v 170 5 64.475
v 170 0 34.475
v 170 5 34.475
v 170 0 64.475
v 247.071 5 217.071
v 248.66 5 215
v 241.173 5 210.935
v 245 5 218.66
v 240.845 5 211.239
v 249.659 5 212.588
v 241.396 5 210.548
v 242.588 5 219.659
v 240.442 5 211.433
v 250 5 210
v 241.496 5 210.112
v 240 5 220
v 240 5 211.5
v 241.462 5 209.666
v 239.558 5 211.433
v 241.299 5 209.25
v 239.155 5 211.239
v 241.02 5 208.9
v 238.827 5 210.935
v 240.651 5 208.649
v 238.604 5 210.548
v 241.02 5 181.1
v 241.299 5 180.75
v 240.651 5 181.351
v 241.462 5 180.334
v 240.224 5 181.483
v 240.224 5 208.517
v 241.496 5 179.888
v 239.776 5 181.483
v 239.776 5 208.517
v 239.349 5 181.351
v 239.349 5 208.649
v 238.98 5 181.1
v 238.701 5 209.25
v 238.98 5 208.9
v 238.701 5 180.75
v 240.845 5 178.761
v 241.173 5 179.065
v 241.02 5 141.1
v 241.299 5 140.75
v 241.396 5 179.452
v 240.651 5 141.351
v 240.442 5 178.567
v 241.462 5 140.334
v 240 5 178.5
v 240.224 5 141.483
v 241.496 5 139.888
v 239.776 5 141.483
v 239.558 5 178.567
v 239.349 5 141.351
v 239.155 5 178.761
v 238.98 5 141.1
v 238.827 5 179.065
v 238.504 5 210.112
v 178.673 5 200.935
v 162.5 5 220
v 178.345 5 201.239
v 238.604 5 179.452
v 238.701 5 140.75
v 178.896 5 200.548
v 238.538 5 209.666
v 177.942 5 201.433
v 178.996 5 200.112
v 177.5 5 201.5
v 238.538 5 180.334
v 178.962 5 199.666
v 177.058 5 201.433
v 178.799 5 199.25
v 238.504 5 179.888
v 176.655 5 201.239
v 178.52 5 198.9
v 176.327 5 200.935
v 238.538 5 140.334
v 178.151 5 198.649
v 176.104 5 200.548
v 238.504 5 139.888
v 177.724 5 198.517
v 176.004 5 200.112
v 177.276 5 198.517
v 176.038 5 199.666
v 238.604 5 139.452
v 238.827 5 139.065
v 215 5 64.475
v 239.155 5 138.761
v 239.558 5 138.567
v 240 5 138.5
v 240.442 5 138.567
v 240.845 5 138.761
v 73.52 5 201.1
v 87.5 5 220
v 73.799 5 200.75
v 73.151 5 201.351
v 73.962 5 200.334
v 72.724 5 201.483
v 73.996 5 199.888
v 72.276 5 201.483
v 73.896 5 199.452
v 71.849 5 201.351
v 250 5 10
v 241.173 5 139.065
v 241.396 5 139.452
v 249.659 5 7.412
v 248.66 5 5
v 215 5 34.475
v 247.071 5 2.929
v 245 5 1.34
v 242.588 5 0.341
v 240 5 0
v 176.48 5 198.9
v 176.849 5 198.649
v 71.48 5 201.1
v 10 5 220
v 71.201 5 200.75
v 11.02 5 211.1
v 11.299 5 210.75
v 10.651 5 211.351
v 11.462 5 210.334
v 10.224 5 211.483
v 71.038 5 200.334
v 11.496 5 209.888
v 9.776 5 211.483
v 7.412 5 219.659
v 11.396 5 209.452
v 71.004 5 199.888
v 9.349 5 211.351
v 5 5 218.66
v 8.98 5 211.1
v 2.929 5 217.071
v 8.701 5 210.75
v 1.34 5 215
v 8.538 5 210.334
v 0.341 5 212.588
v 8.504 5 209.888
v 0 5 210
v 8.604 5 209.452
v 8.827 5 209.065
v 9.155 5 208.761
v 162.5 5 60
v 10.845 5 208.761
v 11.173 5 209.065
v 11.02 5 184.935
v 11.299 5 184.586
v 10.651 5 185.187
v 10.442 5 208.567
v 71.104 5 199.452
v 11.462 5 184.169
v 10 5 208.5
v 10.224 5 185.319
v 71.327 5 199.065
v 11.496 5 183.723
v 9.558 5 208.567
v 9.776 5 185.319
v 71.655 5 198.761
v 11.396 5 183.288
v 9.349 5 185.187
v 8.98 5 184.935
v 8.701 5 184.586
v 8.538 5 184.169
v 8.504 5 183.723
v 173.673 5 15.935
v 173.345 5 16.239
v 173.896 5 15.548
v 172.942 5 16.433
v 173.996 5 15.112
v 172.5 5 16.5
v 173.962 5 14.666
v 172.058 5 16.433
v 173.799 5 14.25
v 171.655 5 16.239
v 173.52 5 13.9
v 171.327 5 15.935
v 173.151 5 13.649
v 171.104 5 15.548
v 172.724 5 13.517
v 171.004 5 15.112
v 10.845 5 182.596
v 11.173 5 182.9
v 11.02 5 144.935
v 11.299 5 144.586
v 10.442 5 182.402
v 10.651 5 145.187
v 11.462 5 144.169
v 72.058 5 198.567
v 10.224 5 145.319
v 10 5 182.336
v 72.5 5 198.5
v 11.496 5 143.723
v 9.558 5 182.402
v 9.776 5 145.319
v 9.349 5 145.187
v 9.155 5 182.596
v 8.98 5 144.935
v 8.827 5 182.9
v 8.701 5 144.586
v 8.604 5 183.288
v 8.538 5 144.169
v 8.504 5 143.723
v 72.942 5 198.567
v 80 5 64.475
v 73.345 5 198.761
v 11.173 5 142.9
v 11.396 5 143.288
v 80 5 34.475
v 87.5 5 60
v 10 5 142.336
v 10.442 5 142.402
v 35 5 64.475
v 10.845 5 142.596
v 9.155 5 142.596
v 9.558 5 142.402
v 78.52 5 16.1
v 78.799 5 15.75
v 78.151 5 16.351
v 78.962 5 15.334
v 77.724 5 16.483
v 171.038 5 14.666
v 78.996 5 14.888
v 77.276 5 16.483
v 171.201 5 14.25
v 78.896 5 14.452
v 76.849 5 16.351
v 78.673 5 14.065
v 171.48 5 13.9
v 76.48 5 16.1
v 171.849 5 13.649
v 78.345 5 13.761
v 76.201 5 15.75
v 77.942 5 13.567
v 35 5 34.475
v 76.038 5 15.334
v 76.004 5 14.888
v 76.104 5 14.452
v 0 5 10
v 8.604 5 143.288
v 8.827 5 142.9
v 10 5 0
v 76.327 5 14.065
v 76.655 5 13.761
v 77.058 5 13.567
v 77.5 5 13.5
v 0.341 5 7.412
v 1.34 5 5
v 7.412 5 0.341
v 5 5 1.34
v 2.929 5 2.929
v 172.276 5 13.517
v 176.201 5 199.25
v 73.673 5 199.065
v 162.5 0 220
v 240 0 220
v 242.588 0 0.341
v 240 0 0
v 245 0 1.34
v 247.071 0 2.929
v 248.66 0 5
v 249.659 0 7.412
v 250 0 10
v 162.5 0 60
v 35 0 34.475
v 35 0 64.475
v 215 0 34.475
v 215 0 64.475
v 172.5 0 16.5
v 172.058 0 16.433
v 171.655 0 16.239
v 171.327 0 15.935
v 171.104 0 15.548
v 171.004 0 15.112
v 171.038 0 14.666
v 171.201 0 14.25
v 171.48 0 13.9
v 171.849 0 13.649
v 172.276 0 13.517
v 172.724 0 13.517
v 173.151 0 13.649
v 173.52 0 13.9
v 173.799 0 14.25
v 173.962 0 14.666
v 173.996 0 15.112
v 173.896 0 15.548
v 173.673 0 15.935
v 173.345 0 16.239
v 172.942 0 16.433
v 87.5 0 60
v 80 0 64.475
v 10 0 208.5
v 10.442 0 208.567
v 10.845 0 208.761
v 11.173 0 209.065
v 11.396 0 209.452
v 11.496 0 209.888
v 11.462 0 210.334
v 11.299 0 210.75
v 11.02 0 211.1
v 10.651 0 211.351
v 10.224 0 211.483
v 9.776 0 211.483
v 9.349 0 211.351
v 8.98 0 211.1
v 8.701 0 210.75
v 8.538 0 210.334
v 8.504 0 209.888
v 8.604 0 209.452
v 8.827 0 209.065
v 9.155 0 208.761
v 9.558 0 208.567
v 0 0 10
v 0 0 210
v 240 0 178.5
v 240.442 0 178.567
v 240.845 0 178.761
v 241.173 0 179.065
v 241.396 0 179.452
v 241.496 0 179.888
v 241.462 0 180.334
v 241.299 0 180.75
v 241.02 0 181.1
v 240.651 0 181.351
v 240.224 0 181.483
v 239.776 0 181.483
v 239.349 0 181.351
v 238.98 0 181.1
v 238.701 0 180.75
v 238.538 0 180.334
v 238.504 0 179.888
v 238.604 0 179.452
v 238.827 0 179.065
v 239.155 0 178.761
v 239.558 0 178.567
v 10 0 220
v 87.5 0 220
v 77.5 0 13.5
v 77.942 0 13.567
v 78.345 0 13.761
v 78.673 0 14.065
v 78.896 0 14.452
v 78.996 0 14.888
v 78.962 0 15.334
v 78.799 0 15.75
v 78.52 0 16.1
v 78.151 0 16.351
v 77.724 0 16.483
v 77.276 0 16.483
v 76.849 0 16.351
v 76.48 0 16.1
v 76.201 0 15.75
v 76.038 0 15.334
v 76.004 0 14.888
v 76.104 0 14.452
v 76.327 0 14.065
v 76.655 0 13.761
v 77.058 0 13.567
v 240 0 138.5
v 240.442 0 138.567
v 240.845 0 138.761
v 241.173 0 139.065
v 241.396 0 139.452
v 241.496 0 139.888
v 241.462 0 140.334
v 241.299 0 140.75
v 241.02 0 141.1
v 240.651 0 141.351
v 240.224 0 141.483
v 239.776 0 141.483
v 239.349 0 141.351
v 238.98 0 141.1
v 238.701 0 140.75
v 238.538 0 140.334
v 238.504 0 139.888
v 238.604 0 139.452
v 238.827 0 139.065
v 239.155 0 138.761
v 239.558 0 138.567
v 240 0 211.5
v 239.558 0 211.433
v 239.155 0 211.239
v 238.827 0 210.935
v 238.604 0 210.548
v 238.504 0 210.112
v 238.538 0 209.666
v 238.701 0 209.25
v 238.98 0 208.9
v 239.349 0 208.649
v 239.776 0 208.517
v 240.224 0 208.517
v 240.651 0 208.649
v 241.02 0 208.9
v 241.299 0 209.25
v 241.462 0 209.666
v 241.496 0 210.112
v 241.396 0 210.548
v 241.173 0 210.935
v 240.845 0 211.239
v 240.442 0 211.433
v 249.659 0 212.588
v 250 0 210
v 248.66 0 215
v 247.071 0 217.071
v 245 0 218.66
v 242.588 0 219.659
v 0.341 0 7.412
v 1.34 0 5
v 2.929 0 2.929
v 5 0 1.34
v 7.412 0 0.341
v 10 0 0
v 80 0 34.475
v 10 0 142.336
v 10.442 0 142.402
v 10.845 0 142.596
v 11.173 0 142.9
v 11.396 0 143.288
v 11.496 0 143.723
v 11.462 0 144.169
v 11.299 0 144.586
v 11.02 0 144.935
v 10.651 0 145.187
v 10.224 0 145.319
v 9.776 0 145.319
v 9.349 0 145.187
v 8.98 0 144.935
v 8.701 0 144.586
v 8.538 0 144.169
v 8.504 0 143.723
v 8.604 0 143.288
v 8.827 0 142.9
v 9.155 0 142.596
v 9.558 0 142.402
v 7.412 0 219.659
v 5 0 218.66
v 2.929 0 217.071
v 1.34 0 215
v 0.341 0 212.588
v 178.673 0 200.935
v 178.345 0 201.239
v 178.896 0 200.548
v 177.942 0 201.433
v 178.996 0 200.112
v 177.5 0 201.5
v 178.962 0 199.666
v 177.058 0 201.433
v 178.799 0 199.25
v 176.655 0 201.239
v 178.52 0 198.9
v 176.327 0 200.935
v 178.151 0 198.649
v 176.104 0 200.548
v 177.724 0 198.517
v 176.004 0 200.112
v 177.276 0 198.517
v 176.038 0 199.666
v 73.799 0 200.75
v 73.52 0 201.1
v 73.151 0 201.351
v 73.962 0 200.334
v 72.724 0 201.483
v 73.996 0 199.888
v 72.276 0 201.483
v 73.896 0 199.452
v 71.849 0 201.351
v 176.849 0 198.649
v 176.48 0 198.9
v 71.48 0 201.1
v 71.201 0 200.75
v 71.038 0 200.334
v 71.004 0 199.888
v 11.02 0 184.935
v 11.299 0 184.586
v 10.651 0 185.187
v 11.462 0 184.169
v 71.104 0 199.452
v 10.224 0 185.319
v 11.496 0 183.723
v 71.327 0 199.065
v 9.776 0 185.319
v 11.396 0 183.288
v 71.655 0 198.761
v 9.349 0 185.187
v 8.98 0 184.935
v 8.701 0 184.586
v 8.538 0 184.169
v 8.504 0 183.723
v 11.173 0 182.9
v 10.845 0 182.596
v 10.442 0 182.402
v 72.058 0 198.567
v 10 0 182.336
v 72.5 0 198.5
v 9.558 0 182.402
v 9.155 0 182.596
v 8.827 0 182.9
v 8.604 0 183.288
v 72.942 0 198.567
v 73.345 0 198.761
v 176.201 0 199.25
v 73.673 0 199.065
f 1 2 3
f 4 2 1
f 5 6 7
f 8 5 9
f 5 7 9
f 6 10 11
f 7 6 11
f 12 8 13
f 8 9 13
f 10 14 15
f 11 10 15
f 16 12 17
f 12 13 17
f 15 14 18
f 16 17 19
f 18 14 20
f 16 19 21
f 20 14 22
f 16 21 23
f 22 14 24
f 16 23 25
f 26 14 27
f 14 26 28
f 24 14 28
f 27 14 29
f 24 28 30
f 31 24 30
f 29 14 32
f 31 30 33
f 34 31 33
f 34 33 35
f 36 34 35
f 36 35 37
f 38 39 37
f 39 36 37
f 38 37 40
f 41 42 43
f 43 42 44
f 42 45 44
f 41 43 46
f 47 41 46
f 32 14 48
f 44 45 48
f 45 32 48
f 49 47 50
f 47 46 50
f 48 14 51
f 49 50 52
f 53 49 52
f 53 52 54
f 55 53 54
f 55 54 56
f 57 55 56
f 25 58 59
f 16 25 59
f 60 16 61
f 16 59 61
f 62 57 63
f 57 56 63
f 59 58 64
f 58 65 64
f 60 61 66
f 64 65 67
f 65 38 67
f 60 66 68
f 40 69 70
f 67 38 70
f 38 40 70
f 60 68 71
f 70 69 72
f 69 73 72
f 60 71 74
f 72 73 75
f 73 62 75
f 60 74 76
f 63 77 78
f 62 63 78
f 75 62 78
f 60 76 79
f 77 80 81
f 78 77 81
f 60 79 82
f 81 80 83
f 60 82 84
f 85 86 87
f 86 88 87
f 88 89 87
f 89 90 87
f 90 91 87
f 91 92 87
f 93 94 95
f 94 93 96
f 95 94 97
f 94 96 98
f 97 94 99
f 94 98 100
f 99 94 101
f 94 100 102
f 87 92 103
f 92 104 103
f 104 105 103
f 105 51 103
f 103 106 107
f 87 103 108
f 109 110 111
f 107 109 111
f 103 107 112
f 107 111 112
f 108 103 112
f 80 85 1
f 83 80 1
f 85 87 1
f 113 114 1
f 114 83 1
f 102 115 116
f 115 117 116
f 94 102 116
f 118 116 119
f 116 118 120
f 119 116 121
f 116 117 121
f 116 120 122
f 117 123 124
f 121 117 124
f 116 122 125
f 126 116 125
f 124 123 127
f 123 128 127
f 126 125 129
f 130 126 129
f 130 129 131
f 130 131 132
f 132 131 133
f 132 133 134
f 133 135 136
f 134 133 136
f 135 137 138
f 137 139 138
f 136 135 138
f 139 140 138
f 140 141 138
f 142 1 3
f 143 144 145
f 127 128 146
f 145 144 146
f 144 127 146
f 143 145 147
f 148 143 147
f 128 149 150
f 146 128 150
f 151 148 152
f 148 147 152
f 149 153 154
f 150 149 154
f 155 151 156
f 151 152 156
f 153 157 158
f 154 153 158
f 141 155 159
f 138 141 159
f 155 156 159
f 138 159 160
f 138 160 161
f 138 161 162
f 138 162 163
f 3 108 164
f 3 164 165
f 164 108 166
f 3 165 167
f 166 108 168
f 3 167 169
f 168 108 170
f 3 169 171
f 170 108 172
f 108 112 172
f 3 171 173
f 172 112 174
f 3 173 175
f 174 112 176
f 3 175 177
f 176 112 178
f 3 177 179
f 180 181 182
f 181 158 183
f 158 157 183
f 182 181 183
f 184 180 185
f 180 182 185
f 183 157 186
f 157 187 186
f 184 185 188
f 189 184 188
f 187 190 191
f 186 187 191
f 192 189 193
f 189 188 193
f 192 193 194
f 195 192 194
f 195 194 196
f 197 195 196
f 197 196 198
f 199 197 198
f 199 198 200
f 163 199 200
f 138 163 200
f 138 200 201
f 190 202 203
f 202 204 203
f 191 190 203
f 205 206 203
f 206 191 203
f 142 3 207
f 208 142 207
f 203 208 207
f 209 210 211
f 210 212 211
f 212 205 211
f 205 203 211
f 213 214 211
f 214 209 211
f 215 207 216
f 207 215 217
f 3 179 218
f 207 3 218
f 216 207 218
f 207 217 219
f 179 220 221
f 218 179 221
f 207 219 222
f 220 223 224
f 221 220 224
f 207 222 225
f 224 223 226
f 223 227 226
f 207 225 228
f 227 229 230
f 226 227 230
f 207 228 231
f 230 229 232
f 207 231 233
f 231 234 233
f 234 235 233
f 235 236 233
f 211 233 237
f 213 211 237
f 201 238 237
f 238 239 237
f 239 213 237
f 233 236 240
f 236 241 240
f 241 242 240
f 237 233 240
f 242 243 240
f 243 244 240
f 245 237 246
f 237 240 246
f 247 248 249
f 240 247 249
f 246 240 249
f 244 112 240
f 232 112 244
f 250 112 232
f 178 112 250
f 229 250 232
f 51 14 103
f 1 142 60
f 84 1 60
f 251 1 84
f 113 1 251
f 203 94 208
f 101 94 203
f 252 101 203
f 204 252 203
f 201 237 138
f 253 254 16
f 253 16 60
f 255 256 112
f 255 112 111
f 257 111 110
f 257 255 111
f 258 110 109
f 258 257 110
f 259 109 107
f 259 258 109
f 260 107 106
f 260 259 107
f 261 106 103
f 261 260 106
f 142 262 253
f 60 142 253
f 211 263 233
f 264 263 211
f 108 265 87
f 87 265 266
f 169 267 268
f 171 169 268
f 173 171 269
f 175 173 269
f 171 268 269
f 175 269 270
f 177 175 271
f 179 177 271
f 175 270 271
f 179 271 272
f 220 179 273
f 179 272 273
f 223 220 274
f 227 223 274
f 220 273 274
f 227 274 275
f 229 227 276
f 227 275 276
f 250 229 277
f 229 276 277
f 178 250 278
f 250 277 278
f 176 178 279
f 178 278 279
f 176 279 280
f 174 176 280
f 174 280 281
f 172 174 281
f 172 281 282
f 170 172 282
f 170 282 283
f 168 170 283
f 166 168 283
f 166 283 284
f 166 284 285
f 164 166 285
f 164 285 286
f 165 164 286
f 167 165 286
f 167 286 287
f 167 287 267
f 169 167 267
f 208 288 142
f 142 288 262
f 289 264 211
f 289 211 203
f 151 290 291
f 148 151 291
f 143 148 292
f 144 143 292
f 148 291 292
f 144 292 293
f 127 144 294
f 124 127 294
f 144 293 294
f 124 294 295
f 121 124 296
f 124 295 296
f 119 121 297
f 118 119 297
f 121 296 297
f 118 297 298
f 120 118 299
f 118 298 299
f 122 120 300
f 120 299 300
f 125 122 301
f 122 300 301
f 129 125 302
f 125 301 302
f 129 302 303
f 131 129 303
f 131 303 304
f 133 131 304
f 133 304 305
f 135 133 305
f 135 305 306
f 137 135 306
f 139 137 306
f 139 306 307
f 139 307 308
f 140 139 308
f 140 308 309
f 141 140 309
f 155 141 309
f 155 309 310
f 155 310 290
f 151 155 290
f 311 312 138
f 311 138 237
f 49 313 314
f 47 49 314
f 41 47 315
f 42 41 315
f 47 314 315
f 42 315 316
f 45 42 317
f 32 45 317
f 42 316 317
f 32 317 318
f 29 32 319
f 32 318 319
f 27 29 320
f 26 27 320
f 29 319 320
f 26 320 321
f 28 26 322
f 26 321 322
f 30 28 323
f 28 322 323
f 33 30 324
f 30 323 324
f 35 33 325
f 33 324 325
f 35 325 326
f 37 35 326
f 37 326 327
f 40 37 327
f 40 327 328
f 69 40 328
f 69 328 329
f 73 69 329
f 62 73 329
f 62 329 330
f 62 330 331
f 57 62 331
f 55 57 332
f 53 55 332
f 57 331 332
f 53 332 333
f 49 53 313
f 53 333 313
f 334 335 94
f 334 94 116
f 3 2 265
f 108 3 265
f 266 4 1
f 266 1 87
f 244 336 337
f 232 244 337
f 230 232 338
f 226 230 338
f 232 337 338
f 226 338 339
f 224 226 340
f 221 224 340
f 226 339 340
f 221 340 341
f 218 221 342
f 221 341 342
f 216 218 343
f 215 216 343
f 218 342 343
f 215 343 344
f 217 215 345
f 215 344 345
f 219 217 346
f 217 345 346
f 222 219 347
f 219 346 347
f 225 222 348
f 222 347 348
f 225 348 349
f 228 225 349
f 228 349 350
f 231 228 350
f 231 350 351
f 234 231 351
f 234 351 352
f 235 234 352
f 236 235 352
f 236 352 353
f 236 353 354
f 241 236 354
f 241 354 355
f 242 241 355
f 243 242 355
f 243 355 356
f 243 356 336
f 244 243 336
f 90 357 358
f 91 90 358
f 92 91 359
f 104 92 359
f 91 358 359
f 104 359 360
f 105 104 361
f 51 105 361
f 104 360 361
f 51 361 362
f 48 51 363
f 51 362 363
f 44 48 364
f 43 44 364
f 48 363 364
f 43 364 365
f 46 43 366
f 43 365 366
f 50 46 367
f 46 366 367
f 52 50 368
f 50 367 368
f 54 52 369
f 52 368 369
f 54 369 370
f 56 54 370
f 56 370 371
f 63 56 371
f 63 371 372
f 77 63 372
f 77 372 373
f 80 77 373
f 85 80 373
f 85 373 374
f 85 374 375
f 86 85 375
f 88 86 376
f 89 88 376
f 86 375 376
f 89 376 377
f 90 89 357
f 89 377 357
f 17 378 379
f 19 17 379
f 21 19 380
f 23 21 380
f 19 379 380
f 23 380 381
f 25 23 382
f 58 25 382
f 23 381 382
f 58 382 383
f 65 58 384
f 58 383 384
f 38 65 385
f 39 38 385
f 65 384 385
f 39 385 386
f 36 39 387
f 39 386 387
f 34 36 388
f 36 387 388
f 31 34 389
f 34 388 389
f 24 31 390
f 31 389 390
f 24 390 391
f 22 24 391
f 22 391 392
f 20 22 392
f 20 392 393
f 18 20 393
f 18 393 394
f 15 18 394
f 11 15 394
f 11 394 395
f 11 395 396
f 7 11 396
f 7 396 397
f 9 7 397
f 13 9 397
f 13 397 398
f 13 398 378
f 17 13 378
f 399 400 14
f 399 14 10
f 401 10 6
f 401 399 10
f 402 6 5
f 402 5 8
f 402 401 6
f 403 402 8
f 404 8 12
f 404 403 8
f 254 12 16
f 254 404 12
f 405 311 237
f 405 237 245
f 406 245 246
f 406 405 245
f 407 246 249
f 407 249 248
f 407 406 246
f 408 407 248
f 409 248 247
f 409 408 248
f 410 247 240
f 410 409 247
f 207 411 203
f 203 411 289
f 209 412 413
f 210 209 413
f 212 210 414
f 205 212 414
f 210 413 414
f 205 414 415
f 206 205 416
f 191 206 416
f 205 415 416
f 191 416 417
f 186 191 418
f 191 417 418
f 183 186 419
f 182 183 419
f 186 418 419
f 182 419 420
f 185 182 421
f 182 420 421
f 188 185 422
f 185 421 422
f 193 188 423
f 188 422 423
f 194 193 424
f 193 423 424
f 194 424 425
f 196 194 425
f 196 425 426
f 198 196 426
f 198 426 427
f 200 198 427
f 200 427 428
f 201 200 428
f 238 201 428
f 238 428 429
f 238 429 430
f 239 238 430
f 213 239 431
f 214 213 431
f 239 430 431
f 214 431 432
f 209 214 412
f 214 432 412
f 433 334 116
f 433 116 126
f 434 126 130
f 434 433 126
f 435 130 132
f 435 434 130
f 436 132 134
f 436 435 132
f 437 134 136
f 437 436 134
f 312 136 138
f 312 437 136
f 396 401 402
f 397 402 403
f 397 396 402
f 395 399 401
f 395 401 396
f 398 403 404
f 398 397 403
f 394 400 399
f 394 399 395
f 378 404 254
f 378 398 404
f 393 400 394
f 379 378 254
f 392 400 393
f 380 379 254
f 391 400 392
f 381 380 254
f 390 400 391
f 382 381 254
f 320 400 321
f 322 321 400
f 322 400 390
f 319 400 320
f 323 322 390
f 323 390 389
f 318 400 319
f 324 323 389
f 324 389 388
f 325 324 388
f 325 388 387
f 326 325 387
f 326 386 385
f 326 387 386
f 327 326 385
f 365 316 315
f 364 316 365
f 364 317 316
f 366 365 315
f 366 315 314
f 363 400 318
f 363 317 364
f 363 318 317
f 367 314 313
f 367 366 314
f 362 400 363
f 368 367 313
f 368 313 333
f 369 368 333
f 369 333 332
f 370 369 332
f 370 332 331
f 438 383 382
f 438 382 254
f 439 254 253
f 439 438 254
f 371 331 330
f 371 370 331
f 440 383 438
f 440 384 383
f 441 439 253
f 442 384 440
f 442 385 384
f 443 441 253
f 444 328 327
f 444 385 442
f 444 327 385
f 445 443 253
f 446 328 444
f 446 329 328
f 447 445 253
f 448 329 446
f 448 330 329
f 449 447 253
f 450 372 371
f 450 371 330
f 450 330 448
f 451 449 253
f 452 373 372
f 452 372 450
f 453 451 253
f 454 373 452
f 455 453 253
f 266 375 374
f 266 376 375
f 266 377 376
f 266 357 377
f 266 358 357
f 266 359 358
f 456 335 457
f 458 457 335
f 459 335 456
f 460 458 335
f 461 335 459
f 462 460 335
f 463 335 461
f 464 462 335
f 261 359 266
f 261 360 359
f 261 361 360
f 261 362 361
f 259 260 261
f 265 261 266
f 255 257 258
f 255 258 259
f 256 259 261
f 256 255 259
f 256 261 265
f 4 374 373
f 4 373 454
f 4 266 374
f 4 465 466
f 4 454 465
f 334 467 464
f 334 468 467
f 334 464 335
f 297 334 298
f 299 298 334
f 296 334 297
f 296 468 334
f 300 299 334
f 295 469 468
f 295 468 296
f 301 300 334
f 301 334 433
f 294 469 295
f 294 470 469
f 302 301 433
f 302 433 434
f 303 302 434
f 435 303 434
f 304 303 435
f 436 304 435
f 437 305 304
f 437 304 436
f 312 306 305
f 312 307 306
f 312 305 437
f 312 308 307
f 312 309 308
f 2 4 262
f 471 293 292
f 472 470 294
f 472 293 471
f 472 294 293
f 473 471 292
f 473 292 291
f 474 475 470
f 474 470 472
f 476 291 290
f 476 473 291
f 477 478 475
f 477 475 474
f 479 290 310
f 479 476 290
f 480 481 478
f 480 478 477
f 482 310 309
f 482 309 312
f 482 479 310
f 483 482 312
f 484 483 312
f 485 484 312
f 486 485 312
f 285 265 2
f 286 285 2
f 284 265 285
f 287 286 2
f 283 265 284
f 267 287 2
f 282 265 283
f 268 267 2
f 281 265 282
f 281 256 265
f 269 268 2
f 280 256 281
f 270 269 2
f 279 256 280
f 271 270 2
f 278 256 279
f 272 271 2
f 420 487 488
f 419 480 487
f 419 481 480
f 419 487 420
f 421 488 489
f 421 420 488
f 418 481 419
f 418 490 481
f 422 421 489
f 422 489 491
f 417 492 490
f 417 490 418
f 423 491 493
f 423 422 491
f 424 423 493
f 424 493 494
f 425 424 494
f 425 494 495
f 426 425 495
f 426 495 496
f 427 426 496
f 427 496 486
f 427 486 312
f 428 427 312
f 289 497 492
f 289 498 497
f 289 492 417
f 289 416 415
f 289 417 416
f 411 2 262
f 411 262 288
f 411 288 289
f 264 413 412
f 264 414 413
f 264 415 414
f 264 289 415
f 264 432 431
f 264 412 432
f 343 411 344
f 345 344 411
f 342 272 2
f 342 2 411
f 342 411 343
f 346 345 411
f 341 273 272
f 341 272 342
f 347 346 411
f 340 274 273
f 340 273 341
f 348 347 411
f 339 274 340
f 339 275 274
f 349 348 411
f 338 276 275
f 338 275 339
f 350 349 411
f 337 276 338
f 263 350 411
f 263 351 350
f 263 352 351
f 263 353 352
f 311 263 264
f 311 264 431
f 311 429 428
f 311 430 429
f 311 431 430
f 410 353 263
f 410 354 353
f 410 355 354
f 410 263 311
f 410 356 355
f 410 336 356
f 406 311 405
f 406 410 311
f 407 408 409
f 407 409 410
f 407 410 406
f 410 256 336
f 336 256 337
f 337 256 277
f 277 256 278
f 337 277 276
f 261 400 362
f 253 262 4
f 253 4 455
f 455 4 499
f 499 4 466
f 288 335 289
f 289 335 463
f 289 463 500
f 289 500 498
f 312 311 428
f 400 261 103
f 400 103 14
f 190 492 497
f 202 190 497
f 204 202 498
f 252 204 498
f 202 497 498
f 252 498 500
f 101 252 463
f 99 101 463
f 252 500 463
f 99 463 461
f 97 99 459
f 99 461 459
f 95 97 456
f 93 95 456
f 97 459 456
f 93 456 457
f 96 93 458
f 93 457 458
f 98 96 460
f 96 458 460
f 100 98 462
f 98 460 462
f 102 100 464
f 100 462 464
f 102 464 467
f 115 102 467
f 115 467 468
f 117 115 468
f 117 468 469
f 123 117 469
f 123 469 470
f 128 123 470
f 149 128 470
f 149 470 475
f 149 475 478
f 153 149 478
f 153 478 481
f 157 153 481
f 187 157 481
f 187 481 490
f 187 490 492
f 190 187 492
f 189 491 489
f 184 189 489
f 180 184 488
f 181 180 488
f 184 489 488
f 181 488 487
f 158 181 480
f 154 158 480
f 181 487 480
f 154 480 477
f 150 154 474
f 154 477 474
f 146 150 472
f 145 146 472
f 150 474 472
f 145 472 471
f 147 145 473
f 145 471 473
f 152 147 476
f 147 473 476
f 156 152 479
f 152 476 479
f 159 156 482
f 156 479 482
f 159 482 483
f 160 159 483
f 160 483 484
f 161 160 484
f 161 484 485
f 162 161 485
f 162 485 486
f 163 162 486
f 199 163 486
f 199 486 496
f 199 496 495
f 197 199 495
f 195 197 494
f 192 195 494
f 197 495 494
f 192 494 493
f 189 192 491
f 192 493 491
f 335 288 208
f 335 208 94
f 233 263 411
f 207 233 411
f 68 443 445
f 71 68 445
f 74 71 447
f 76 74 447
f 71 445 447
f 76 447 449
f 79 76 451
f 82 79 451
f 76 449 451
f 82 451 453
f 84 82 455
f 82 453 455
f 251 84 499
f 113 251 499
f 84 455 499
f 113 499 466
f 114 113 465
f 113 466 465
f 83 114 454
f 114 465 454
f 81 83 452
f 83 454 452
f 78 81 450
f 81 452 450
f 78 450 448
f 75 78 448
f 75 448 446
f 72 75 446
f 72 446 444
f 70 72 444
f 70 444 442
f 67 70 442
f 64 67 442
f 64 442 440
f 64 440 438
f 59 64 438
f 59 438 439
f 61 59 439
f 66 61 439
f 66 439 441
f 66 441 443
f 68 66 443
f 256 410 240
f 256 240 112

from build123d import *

# Parameters (mm, degrees)
EXTRUDE_1_DEPTH      = 5
SKETCH_4_W           = 45
SKETCH_4_H           = 30
CUT_EXTRUDE_3_DEPTH  = 5
SKETCH_5_W           = 75
SKETCH_5_H           = 160
CUT_EXTRUDE_4_DEPTH  = 5
CUT_EXTRUDE_5_REACH  = 335.054
SKETCH_6_R           = 1.5
CUT_EXTRUDE_9_REACH  = 335.054
SKETCH_9_R           = 1.5
SKETCH_11_R          = 1.5
CUT_EXTRUDE_10_DEPTH = 5


with BuildPart() as part:
    # 草图1 → 凸台-拉伸1 (new body)
    with BuildSketch(Plane(origin=(0, 0, 0), x_dir=(1, 0, 0), z_dir=(0, 1, 0))):
        with BuildLine():
            Line((10, 0), (240, 0))
            ThreePointArc((240, 0), (247.071067812, -2.928932188), (250, -10))
            Line((250, -10), (250, -210))
            ThreePointArc((250, -210), (247.071067812, -217.071067812), (240, -220))
            Line((240, -220), (10, -220))
            ThreePointArc((10, -220), (2.928932188, -217.071067812), (0, -210))
            Line((0, -210), (0, -10))
            ThreePointArc((0, -10), (2.928932188, -2.928932188), (10, 0))
        make_face()
    extrude(amount=EXTRUDE_1_DEPTH)

    # 草图4 → 切除-拉伸3 (cut)
    with BuildSketch(Plane.XZ):
        with Locations((192.5, 49.475)):
            Rectangle(SKETCH_4_W, SKETCH_4_H)
        with Locations((57.5, 49.475)):
            Rectangle(SKETCH_4_W, SKETCH_4_H)
    extrude(amount=-CUT_EXTRUDE_3_DEPTH, mode=Mode.SUBTRACT)

    # 草图5 → 切除-拉伸4 (cut)
    with BuildSketch(Plane.XZ):
        with Locations((125, 140)):
            Rectangle(SKETCH_5_W, SKETCH_5_H)
    extrude(amount=-CUT_EXTRUDE_4_DEPTH, mode=Mode.SUBTRACT)

    # 草图6 → 切除-拉伸5 (cut, up to next)
    with BuildSketch(Plane.XZ, mode=Mode.PRIVATE) as cut_extrude_5_sk1:
        with Locations(Location((72.5, 200, 0), (0, 0, 270))):
            Circle(SKETCH_6_R)
    cut_extrude_5_tool1 = extrude(cut_extrude_5_sk1.sketch, amount=-CUT_EXTRUDE_5_REACH, mode=Mode.PRIVATE) & part.part
    # 草图6 → 切除-拉伸5 (cut, up to next)
    with BuildSketch(Plane.XZ, mode=Mode.PRIVATE) as cut_extrude_5_sk2:
        with Locations(Location((177.5, 200, 0), (0, 0, 90))):
            Circle(SKETCH_6_R)
    cut_extrude_5_tool2 = extrude(cut_extrude_5_sk2.sketch, amount=-CUT_EXTRUDE_5_REACH, mode=Mode.PRIVATE) & part.part
    add(cut_extrude_5_tool1.solids().sort_by_distance((72.5, 0, 200))[0], mode=Mode.SUBTRACT)
    add(cut_extrude_5_tool2.solids().sort_by_distance((177.5, 0, 200))[0], mode=Mode.SUBTRACT)

    # 草图9 → 切除-拉伸9 (cut, up to next)
    with BuildSketch(Plane.XZ, mode=Mode.PRIVATE) as cut_extrude_9_sk1:
        with Locations(Location((77.5, 15, 0), (0, 0, 270))):
            Circle(SKETCH_9_R)
    cut_extrude_9_tool1 = extrude(cut_extrude_9_sk1.sketch, amount=-CUT_EXTRUDE_9_REACH, mode=Mode.PRIVATE) & part.part
    # 草图9 → 切除-拉伸9 (cut, up to next)
    with BuildSketch(Plane.XZ, mode=Mode.PRIVATE) as cut_extrude_9_sk2:
        with Locations(Location((10, 210, 0), (0, 0, 270))):
            Circle(SKETCH_9_R)
    cut_extrude_9_tool2 = extrude(cut_extrude_9_sk2.sketch, amount=-CUT_EXTRUDE_9_REACH, mode=Mode.PRIVATE) & part.part
    # 草图9 → 切除-拉伸9 (cut, up to next)
    with BuildSketch(Plane.XZ, mode=Mode.PRIVATE) as cut_extrude_9_sk3:
        with Locations(Location((240, 210, 0), (0, 0, 90))):
            Circle(SKETCH_9_R)
    cut_extrude_9_tool3 = extrude(cut_extrude_9_sk3.sketch, amount=-CUT_EXTRUDE_9_REACH, mode=Mode.PRIVATE) & part.part
    # 草图9 → 切除-拉伸9 (cut, up to next)
    with BuildSketch(Plane.XZ, mode=Mode.PRIVATE) as cut_extrude_9_sk4:
        with Locations(Location((172.5, 15, 0), (0, 0, 90))):
            Circle(SKETCH_9_R)
    cut_extrude_9_tool4 = extrude(cut_extrude_9_sk4.sketch, amount=-CUT_EXTRUDE_9_REACH, mode=Mode.PRIVATE) & part.part
    add(cut_extrude_9_tool1.solids().sort_by_distance((77.5, 0, 15))[0], mode=Mode.SUBTRACT)
    add(cut_extrude_9_tool2.solids().sort_by_distance((10, 0, 210))[0], mode=Mode.SUBTRACT)
    add(cut_extrude_9_tool3.solids().sort_by_distance((240, 0, 210))[0], mode=Mode.SUBTRACT)
    add(cut_extrude_9_tool4.solids().sort_by_distance((172.5, 0, 15))[0], mode=Mode.SUBTRACT)

    # 草图11 → 切除-拉伸10 (cut)
    with BuildSketch(Plane.XZ):
        with Locations(Location((240, 180, 0), (0, 0, 270))):
            Circle(SKETCH_11_R)
        with Locations(Location((240, 140, 0), (0, 0, 270))):
            Circle(SKETCH_11_R)
        with Locations(Location((10, 143.83552588, 0), (0, 0, 270))):
            Circle(SKETCH_11_R)
        with Locations(Location((10, 183.83552588, 0), (0, 0, 270))):
            Circle(SKETCH_11_R)
    extrude(amount=-CUT_EXTRUDE_10_DEPTH, mode=Mode.SUBTRACT)


solid = part.part
